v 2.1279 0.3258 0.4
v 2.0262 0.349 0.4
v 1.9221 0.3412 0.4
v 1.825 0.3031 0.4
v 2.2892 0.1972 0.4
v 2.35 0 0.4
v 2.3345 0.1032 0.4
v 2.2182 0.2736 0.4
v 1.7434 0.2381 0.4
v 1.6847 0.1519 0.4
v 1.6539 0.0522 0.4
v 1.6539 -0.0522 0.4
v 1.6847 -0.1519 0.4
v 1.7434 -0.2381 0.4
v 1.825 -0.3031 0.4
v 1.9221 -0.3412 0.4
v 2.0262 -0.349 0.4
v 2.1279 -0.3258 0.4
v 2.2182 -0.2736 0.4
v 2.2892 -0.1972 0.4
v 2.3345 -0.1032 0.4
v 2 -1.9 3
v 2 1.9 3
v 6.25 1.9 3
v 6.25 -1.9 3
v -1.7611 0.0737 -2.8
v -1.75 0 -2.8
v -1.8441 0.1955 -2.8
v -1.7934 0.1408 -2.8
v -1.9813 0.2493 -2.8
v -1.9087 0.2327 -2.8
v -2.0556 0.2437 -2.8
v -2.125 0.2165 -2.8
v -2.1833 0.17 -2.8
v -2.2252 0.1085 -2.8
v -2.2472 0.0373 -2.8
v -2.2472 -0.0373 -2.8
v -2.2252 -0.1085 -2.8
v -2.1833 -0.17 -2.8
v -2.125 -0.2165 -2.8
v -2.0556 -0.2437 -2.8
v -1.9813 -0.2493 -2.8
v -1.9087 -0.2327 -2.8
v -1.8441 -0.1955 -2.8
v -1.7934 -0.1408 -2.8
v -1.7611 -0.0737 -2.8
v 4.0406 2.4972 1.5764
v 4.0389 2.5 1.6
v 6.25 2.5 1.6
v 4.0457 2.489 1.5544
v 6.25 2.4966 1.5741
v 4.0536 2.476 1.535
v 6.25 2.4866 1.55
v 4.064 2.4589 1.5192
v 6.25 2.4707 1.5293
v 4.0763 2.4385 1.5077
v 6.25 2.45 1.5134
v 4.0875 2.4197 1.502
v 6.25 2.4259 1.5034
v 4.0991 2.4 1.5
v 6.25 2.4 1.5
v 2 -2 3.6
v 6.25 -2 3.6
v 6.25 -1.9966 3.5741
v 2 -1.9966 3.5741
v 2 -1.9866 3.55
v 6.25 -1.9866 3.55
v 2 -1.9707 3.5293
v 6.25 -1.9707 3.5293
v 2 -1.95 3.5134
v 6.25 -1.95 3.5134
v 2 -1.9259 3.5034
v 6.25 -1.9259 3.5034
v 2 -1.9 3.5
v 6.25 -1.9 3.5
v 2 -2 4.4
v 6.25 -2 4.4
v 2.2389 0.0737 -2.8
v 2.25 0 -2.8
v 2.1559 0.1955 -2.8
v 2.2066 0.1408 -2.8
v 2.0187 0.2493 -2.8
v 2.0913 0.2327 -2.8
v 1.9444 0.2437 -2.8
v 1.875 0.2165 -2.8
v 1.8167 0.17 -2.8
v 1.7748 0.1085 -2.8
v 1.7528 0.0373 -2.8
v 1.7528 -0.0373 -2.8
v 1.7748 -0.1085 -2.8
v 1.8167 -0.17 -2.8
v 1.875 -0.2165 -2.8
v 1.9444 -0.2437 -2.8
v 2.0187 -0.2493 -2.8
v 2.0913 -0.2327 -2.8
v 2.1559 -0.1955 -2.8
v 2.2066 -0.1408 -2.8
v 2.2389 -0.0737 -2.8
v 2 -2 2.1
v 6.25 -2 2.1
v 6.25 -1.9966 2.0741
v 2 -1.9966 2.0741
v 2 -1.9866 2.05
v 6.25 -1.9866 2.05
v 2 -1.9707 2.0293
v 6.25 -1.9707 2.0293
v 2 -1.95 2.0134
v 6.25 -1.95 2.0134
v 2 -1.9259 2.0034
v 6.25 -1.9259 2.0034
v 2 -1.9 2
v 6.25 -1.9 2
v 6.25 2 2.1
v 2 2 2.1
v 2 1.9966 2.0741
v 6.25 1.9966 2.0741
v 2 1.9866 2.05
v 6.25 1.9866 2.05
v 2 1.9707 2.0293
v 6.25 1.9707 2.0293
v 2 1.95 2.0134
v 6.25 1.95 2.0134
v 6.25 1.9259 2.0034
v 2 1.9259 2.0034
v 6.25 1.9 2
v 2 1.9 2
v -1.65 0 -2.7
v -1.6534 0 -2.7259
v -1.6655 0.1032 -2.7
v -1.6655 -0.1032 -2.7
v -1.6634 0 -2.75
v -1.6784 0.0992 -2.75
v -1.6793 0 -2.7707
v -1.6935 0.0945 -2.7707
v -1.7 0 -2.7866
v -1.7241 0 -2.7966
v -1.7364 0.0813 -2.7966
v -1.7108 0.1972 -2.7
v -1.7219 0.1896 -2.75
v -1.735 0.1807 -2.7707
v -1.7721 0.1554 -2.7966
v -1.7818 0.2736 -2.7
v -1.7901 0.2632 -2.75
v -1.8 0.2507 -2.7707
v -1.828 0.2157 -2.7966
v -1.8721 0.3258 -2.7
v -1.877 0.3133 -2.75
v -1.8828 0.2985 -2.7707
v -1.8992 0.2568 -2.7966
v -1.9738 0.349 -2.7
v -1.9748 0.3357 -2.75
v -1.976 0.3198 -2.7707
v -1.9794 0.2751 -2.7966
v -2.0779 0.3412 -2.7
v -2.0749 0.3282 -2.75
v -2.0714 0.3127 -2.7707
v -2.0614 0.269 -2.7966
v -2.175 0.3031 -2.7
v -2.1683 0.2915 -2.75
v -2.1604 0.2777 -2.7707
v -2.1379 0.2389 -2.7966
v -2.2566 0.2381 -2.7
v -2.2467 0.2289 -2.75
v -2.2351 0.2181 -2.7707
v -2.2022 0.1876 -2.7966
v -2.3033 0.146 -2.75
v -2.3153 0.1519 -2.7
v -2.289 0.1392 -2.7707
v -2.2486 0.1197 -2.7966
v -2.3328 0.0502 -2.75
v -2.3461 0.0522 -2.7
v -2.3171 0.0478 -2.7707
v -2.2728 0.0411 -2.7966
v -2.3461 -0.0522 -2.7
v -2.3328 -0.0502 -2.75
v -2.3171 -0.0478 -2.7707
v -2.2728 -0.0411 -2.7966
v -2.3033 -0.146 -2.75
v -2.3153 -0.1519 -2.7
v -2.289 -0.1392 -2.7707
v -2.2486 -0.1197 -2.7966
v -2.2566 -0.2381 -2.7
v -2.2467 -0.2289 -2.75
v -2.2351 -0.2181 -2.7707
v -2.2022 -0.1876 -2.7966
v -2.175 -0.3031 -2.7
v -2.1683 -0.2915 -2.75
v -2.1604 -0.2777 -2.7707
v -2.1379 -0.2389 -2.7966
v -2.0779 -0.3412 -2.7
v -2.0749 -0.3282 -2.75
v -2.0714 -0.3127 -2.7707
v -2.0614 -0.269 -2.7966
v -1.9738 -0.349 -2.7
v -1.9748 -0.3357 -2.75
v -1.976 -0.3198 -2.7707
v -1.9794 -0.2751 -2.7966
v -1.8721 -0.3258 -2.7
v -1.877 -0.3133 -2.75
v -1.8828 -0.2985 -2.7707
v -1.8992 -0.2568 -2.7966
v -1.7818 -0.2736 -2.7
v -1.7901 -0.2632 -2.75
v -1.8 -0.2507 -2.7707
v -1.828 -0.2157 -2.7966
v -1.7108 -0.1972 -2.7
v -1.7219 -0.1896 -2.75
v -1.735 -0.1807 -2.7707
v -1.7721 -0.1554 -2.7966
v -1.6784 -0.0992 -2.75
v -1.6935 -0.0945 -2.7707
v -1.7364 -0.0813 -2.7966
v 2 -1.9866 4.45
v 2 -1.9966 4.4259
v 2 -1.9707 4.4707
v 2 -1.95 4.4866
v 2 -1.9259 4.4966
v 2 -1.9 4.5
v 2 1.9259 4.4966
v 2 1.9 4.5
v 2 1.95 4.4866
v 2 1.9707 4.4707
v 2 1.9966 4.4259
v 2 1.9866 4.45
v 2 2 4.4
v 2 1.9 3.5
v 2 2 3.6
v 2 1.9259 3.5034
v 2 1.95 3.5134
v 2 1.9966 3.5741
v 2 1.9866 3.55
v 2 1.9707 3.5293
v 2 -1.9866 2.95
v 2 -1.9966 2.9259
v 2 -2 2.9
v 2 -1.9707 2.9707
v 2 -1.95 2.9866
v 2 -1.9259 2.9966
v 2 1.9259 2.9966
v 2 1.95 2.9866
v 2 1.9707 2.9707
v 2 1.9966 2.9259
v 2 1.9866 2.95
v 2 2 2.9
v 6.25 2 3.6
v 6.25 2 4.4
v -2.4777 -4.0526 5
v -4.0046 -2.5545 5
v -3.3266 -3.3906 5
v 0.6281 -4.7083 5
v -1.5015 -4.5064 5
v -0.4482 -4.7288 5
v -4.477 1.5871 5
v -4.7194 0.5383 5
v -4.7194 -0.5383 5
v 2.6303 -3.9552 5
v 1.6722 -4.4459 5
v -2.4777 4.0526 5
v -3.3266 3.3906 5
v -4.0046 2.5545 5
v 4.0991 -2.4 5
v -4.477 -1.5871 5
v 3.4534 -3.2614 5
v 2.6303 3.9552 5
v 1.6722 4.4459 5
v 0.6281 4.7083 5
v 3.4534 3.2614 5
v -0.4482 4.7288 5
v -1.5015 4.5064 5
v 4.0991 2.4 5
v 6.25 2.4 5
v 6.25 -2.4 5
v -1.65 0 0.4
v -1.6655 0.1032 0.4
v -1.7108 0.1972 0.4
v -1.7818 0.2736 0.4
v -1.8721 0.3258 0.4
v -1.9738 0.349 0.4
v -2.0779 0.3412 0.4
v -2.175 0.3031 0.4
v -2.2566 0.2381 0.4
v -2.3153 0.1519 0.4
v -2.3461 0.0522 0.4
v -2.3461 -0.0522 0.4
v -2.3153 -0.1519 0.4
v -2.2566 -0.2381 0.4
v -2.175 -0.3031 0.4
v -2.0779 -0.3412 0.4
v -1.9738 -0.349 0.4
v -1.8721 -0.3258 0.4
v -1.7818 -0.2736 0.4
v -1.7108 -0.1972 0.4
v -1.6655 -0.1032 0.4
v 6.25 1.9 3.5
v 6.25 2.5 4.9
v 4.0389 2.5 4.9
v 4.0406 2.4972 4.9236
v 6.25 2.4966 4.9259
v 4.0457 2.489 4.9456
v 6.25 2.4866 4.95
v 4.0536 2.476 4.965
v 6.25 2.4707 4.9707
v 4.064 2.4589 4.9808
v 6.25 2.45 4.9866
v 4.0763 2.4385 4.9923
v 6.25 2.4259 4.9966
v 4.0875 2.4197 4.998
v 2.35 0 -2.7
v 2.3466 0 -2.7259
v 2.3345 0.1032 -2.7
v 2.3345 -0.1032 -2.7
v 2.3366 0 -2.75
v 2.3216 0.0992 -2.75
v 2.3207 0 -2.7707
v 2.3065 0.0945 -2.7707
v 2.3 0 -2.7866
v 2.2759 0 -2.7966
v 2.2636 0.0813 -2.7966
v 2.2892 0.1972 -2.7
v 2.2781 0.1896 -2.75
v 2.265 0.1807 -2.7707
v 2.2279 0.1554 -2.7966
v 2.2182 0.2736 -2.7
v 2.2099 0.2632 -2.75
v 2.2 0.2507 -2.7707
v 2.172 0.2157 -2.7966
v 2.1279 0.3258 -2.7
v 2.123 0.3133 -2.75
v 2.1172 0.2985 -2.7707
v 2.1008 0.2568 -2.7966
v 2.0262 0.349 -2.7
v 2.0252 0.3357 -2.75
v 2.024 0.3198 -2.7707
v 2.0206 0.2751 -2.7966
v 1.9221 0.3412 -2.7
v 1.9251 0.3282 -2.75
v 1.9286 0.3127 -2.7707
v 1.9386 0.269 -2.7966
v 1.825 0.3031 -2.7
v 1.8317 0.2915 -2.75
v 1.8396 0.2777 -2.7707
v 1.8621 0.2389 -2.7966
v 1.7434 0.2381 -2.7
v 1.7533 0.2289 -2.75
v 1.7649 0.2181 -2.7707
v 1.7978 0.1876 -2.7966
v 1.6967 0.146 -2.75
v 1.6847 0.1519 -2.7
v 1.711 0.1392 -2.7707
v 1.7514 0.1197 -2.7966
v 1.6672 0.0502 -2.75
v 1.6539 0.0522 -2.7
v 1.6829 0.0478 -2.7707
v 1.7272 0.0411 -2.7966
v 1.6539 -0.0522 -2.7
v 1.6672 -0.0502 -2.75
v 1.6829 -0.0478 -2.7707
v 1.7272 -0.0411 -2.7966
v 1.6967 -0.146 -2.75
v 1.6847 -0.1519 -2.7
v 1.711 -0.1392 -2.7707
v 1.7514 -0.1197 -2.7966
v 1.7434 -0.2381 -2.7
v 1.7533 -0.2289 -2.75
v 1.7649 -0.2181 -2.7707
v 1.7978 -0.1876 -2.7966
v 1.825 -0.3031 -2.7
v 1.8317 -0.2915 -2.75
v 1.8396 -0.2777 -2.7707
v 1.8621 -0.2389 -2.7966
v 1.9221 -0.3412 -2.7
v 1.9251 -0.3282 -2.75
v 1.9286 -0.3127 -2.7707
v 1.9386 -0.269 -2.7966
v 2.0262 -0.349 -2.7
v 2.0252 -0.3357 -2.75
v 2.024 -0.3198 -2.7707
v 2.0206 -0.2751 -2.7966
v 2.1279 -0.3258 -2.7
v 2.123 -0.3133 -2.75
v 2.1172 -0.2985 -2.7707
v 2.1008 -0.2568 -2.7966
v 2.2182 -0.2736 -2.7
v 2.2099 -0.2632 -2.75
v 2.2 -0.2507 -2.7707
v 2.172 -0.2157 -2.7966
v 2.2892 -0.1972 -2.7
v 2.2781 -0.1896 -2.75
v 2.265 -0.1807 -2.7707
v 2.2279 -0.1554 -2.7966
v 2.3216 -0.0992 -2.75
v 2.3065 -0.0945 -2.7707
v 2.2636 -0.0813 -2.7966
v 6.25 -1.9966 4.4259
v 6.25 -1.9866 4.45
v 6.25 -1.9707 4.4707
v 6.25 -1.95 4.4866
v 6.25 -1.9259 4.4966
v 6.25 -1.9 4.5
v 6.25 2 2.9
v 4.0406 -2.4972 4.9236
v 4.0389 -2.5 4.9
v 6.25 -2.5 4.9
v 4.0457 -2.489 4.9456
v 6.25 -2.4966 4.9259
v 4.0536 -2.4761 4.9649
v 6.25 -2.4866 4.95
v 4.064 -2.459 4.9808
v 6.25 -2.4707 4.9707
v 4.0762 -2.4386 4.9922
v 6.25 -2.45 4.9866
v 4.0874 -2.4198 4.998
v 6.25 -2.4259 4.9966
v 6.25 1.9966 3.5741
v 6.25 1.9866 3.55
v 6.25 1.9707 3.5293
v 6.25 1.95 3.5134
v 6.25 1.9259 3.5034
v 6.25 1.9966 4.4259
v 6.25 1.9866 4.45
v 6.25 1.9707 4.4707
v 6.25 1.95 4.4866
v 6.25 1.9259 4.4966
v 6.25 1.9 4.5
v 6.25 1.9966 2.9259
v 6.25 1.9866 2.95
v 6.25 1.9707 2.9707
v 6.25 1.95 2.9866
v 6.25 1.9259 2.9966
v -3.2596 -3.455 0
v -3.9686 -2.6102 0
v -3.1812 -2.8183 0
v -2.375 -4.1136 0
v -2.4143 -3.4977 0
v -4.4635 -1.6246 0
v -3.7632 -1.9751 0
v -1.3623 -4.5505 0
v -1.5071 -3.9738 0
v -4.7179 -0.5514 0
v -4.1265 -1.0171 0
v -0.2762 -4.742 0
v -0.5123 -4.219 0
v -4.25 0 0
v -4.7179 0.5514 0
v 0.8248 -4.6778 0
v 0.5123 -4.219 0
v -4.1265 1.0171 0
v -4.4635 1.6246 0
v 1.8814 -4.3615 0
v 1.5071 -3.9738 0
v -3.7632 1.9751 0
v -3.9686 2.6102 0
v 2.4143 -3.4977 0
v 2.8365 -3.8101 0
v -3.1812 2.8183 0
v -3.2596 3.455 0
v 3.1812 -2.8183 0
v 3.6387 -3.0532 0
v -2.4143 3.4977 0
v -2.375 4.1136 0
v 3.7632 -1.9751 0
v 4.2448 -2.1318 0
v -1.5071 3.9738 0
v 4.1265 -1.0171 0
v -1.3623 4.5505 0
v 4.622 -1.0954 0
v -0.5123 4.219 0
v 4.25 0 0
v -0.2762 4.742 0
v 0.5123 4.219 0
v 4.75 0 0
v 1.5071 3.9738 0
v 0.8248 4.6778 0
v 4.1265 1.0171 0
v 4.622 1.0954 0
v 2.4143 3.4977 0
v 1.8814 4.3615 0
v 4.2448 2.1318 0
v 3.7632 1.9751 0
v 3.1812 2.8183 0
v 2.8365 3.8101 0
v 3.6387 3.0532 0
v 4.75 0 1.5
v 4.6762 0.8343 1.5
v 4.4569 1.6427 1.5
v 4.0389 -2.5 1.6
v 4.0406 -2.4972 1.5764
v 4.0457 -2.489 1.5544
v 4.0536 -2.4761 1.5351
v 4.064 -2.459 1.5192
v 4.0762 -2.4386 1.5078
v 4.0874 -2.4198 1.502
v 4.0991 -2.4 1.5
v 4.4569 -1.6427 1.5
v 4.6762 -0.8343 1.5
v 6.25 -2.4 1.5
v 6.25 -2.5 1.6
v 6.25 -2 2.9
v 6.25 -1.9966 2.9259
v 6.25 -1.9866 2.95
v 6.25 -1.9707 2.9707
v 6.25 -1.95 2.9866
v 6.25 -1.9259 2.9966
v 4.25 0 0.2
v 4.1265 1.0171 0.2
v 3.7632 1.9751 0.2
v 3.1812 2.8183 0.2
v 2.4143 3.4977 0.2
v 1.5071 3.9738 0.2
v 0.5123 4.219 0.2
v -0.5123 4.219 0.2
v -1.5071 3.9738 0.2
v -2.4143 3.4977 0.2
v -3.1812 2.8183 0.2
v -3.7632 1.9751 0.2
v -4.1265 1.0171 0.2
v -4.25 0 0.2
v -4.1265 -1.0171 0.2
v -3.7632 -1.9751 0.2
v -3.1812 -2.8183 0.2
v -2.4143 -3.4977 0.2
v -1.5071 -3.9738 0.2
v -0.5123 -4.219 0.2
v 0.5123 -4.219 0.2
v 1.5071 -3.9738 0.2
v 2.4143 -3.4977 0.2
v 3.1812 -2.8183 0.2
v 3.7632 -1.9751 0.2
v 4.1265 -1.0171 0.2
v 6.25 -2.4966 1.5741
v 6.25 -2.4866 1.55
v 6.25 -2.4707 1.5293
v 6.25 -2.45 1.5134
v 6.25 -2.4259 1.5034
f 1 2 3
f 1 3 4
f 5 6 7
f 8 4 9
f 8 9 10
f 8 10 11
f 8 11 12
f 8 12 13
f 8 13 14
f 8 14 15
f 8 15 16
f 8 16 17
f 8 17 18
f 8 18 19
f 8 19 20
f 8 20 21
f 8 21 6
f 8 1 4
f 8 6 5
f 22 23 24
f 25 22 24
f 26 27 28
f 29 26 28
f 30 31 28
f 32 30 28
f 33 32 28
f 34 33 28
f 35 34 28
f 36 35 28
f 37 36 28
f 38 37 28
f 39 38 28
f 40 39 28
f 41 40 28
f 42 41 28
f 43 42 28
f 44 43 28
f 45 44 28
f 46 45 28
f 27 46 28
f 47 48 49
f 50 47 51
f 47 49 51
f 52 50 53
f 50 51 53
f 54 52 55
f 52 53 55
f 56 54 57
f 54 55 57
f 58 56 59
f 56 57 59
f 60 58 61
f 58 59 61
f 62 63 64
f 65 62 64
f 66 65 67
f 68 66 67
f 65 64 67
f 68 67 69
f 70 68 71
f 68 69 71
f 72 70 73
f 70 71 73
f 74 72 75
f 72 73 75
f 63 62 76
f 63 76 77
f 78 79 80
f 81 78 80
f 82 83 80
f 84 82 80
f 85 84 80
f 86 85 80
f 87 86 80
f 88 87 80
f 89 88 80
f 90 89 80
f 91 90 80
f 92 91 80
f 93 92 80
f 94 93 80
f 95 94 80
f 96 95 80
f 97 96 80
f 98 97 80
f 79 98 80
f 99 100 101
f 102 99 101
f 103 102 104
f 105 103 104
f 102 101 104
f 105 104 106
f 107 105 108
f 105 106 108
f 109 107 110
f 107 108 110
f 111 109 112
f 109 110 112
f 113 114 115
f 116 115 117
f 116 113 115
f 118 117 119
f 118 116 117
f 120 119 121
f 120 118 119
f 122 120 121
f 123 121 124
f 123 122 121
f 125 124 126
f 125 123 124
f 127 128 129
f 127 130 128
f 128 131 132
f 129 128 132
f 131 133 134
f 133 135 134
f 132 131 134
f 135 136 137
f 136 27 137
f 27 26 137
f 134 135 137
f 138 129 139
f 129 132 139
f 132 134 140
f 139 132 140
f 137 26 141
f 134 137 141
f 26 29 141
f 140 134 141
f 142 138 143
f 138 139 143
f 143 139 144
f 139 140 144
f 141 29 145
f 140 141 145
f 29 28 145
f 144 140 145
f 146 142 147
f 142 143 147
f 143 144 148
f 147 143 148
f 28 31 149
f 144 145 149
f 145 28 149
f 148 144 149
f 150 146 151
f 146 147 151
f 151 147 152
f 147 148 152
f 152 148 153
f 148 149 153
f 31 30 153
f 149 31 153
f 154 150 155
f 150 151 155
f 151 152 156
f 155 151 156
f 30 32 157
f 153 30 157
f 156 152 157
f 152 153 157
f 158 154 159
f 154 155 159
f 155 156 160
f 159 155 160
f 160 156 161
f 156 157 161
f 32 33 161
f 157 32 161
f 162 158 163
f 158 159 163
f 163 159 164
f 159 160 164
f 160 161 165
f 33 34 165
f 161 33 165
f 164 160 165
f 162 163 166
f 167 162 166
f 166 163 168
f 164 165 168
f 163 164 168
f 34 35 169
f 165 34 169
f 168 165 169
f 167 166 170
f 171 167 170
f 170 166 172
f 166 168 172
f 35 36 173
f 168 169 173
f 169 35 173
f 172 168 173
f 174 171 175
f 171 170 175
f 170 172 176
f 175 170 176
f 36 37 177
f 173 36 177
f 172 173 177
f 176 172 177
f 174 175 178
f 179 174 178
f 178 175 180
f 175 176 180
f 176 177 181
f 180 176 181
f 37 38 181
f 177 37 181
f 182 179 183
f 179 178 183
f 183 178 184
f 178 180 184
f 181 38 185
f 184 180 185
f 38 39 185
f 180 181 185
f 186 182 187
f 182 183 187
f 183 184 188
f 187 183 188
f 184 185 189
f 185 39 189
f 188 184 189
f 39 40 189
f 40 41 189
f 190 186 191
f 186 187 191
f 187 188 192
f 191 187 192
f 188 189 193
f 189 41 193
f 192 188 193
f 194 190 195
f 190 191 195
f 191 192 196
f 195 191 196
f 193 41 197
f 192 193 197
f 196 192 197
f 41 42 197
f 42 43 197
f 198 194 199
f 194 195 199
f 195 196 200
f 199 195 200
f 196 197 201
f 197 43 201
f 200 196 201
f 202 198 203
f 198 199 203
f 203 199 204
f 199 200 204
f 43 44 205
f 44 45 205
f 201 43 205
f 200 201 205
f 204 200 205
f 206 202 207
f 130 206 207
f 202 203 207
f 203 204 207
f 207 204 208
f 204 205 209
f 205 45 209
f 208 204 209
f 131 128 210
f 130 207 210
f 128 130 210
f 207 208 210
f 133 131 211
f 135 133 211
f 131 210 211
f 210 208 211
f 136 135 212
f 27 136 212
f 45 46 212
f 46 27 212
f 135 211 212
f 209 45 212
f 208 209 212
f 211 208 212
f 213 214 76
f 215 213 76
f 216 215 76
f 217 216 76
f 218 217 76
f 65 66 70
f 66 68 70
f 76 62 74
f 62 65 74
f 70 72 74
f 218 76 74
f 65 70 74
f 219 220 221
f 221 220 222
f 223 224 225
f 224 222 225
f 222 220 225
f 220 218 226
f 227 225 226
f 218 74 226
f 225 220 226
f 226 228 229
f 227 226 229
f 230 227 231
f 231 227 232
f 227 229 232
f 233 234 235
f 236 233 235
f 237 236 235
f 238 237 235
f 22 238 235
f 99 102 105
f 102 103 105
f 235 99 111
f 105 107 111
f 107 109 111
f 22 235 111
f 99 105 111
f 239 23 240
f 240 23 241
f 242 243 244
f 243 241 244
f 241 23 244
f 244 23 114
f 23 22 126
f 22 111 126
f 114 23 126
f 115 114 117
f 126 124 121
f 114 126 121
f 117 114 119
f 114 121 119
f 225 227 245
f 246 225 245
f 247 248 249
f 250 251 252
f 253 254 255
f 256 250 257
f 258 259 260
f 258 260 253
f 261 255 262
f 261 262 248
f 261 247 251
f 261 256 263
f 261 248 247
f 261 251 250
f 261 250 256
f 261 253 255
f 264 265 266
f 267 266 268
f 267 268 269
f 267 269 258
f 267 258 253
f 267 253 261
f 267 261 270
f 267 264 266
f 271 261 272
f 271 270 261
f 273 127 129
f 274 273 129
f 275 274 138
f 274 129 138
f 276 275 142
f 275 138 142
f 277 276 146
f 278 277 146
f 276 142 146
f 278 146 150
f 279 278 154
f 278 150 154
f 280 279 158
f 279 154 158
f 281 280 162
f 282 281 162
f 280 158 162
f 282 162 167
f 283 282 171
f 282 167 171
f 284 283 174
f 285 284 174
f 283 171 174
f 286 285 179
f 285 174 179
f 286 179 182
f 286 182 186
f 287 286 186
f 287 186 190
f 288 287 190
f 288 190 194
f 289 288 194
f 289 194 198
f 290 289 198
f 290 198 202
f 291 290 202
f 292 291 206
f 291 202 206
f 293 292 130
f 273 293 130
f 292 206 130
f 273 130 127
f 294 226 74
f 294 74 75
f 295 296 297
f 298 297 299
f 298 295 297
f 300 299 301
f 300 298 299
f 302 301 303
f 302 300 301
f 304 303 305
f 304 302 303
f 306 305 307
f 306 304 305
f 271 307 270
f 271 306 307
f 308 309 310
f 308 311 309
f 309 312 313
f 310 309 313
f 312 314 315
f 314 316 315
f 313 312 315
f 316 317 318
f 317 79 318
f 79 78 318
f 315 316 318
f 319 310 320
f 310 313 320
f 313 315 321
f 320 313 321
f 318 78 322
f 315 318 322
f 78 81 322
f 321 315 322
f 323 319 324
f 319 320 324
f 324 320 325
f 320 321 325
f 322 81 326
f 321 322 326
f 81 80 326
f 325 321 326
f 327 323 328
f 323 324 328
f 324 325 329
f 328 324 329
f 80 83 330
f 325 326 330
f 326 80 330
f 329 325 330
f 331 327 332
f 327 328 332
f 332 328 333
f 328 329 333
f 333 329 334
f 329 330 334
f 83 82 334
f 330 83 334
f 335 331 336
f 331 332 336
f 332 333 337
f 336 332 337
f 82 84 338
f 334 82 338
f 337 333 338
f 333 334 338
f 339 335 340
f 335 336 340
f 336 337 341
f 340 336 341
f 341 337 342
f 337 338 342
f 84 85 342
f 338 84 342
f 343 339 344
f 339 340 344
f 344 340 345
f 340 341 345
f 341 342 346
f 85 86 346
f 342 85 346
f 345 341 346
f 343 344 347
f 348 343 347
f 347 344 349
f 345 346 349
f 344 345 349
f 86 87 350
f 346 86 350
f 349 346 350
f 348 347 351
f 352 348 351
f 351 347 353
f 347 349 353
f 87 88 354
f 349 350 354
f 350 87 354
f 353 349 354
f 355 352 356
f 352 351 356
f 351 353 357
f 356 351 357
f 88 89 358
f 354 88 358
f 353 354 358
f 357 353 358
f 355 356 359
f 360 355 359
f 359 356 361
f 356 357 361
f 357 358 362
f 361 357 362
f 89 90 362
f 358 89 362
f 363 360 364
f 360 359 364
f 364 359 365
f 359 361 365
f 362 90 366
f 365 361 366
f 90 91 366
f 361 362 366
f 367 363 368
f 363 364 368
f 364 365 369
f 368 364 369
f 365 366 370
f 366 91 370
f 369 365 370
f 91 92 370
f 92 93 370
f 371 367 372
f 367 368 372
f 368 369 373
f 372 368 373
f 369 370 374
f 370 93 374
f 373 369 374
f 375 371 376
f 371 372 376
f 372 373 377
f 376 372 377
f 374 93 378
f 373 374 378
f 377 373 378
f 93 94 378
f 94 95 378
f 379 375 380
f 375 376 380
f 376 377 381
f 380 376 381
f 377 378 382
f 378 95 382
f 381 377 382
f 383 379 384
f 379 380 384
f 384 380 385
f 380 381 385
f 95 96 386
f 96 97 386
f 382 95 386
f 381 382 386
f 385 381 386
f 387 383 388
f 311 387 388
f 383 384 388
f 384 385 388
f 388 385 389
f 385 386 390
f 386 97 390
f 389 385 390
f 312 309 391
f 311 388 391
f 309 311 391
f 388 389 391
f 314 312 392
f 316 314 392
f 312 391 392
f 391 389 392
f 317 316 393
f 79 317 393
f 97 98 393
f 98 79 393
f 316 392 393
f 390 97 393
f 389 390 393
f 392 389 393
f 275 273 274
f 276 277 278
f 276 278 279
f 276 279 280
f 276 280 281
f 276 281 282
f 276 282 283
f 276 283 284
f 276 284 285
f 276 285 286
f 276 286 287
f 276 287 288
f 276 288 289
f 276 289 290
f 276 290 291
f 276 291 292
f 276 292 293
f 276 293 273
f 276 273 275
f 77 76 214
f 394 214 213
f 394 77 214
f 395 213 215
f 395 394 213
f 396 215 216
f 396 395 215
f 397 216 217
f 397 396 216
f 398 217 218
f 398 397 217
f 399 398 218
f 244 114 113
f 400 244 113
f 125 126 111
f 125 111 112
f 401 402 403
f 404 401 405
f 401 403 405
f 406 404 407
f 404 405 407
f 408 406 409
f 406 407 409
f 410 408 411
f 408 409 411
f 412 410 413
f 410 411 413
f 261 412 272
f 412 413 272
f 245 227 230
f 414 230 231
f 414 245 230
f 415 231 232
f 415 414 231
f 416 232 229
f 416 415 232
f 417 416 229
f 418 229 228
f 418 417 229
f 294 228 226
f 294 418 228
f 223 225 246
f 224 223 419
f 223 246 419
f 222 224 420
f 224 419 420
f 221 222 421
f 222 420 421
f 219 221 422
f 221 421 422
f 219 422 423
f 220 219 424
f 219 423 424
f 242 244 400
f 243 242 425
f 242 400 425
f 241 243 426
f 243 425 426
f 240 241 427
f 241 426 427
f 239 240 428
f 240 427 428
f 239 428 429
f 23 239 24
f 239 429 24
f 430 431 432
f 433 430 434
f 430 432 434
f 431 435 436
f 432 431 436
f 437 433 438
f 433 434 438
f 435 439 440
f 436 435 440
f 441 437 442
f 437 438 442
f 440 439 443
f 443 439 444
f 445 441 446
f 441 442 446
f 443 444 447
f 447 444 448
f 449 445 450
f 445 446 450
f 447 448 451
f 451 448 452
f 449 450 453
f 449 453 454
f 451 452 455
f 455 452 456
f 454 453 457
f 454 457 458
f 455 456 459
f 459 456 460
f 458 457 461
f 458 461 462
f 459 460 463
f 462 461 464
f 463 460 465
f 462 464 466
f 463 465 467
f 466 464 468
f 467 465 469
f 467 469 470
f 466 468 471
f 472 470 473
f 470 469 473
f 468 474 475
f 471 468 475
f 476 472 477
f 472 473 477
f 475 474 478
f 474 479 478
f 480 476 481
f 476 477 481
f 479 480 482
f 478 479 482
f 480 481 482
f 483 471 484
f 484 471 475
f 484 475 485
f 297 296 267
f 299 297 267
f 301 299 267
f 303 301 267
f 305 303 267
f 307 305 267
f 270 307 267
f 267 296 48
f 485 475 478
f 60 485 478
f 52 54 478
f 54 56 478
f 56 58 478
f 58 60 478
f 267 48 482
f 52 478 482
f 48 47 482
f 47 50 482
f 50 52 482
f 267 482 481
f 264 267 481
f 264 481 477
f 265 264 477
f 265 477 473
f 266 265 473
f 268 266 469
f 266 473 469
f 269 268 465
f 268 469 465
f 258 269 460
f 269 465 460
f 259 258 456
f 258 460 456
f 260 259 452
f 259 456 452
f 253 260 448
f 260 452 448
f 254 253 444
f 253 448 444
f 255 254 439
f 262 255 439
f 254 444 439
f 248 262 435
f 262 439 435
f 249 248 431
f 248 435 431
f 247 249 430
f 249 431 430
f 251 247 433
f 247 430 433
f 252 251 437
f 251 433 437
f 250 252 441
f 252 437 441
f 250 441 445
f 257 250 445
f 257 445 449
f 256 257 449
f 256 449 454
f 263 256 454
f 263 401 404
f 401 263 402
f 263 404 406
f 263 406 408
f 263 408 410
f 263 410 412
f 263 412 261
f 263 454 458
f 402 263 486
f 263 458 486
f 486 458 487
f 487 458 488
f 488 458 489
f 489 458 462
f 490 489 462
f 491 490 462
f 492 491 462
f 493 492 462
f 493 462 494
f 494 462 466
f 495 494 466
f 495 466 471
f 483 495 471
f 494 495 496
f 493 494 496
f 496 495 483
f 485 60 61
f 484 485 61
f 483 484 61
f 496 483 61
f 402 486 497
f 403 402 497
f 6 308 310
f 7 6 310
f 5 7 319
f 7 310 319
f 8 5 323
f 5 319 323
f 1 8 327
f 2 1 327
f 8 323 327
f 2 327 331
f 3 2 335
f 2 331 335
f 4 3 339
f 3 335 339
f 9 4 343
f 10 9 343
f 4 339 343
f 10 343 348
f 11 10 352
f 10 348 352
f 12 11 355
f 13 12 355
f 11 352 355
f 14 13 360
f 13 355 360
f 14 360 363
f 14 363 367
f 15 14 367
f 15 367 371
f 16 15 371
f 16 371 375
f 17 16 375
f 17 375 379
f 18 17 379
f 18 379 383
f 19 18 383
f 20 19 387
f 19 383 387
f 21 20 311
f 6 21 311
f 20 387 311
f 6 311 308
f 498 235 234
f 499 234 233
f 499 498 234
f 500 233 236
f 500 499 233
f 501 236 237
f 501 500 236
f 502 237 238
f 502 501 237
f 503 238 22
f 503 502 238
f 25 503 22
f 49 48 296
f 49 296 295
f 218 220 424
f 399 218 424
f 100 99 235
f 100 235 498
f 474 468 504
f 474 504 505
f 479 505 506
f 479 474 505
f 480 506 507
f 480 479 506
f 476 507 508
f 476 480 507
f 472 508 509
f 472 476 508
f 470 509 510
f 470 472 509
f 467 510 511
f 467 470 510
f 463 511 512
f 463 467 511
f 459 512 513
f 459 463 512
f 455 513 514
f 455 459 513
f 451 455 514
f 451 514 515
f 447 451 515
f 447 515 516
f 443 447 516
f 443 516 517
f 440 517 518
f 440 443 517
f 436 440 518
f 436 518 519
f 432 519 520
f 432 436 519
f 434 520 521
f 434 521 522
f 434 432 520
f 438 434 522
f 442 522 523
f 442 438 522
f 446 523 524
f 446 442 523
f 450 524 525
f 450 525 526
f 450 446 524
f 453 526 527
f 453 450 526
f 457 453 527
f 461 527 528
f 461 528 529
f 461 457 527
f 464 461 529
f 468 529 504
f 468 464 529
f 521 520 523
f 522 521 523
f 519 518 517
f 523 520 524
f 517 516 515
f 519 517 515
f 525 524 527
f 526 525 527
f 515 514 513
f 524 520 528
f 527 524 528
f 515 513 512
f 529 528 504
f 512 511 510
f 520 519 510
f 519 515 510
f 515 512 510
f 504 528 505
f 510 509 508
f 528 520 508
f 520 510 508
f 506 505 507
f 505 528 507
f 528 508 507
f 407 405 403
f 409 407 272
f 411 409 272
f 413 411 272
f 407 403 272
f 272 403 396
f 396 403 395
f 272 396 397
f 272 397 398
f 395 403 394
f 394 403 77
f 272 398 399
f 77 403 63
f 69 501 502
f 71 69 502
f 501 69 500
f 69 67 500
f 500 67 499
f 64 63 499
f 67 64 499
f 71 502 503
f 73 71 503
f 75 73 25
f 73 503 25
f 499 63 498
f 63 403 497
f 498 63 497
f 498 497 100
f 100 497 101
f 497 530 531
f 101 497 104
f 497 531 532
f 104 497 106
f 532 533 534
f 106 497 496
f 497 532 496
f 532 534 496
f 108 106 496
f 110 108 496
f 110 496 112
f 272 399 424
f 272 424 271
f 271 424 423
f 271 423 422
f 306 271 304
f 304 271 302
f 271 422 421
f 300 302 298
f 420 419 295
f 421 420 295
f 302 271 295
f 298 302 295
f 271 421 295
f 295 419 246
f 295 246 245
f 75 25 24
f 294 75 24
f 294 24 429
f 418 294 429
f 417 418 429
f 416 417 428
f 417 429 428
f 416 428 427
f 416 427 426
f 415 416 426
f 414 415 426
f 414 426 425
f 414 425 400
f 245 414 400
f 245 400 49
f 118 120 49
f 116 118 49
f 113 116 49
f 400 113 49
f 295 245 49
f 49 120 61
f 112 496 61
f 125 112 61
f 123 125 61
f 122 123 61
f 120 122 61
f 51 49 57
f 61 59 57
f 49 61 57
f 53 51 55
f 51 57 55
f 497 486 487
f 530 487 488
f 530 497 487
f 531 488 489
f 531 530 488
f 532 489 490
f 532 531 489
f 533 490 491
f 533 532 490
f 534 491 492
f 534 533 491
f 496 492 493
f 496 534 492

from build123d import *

# Parameters (mm, degrees)
CYLINDER001_R     = 0.35
CYLINDER001_DEPTH = 3.2
FILLET003_R       = 0.1
CYLINDER003_R     = 0.35
CYLINDER003_DEPTH = 3.2
FILLET004_R       = 0.1
BOX002_W          = 5
BOX002_H          = 4
BOX002_DEPTH      = 1
FILLET002_R       = 0.1
BOX001_W          = 5
BOX001_H          = 4
BOX001_DEPTH      = 1
FILLET001_R       = 0.1
BOX_W             = 3
BOX_H             = 5
BOX_DEPTH         = 3.5
FILLET_R          = 0.1
CYLINDER002_R     = 4.25
CYLINDER002_DEPTH = 0.2
CYLINDER_R        = 4.75
CYLINDER_DEPTH    = 5


with BuildPart() as fillet003:
    # Cylinder001 → Cylinder001 (new body)
    with BuildSketch(Plane(origin=(2, 0, -2.8), x_dir=(1, 0, 0), z_dir=(0, 0, 1))):
        Circle(CYLINDER001_R)
    extrude(amount=CYLINDER001_DEPTH)

    # Fillet003
    fillet003_edges = [fillet003.edges().sort_by_distance(p)[0] for p in [
        (1.65, 0, -2.8),
    ]]
    fillet(fillet003_edges, radius=FILLET003_R)


with BuildPart() as fillet004:
    # Cylinder003 → Cylinder003 (new body)
    with BuildSketch(Plane(origin=(-2, 0, -2.8), x_dir=(1, 0, 0), z_dir=(0, 0, 1))):
        Circle(CYLINDER003_R)
    extrude(amount=CYLINDER003_DEPTH)

    # Fillet004
    fillet004_edges = [fillet004.edges().sort_by_distance(p)[0] for p in [
        (-2.35, 0, -2.8),
    ]]
    fillet(fillet004_edges, radius=FILLET004_R)


with BuildPart() as fillet002:
    # Box002 → Box002 (new body)
    with BuildSketch(Plane(origin=(2, -2, 2), x_dir=(1, 0, 0), z_dir=(0, 0, 1))):
        with Locations((2.5, 2)):
            Rectangle(BOX002_W, BOX002_H)
    extrude(amount=BOX002_DEPTH)

    # Fillet002
    fillet002_edges = [fillet002.edges().sort_by_distance(p)[0] for p in [
        (4.5, -2, 2),
        (4.5, -2, 3),
        (4.5, 2, 2),
        (4.5, 2, 3),
    ]]
    fillet(fillet002_edges, radius=FILLET002_R)


with BuildPart() as fillet002_1:
    # Fillet002 placement: moved
    add(fillet002.part.moved(Location((0, 0, 1.5))))


with BuildPart() as fusion001:
    # Box001 → Box001 (new body)
    with BuildSketch(Plane(origin=(2, -2, 2), x_dir=(1, 0, 0), z_dir=(0, 0, 1))):
        with Locations((2.5, 2)):
            Rectangle(BOX001_W, BOX001_H)
    extrude(amount=BOX001_DEPTH)

    # Fillet001
    fillet001_edges = [fusion001.edges().sort_by_distance(p)[0] for p in [
        (4.5, -2, 2),
        (4.5, -2, 3),
        (4.5, 2, 2),
        (4.5, 2, 3),
    ]]
    fillet(fillet001_edges, radius=FILLET001_R)

    # Fusion001: union Fillet002
    add(fillet002_1.part)


with BuildPart() as fillet_body:
    # Box → Box (new body)
    with BuildSketch(Plane(origin=(3.25, -2.5, 1.5), x_dir=(1, 0, 0), z_dir=(0, 0, 1))):
        with Locations((1.5, 2.5)):
            Rectangle(BOX_W, BOX_H)
    extrude(amount=BOX_DEPTH)

    # Fillet
    fillet_edges = [fillet_body.edges().sort_by_distance(p)[0] for p in [
        (4.75, -2.5, 1.5),
        (4.75, -2.5, 5),
        (4.75, 2.5, 1.5),
        (4.75, 2.5, 5),
    ]]
    fillet(fillet_edges, radius=FILLET_R)


with BuildPart() as cylinder002:
    # Cylinder002 → Cylinder002 (new body)
    with BuildSketch(Plane.XY):
        Circle(CYLINDER002_R)
    extrude(amount=CYLINDER002_DEPTH)


with BuildPart() as cut001:
    # Cylinder → Cylinder (new body)
    with BuildSketch(Plane.XY):
        Circle(CYLINDER_R)
    extrude(amount=CYLINDER_DEPTH)

    # Cut: cut Cylinder002
    add(cylinder002.part, mode=Mode.SUBTRACT)

    # Fusion: union Fillet body
    add(fillet_body.part)

    # Cut001: cut Fusion001
    add(fusion001.part, mode=Mode.SUBTRACT)


solid = Compound([fillet003.part, fillet004.part, cut001.part])
